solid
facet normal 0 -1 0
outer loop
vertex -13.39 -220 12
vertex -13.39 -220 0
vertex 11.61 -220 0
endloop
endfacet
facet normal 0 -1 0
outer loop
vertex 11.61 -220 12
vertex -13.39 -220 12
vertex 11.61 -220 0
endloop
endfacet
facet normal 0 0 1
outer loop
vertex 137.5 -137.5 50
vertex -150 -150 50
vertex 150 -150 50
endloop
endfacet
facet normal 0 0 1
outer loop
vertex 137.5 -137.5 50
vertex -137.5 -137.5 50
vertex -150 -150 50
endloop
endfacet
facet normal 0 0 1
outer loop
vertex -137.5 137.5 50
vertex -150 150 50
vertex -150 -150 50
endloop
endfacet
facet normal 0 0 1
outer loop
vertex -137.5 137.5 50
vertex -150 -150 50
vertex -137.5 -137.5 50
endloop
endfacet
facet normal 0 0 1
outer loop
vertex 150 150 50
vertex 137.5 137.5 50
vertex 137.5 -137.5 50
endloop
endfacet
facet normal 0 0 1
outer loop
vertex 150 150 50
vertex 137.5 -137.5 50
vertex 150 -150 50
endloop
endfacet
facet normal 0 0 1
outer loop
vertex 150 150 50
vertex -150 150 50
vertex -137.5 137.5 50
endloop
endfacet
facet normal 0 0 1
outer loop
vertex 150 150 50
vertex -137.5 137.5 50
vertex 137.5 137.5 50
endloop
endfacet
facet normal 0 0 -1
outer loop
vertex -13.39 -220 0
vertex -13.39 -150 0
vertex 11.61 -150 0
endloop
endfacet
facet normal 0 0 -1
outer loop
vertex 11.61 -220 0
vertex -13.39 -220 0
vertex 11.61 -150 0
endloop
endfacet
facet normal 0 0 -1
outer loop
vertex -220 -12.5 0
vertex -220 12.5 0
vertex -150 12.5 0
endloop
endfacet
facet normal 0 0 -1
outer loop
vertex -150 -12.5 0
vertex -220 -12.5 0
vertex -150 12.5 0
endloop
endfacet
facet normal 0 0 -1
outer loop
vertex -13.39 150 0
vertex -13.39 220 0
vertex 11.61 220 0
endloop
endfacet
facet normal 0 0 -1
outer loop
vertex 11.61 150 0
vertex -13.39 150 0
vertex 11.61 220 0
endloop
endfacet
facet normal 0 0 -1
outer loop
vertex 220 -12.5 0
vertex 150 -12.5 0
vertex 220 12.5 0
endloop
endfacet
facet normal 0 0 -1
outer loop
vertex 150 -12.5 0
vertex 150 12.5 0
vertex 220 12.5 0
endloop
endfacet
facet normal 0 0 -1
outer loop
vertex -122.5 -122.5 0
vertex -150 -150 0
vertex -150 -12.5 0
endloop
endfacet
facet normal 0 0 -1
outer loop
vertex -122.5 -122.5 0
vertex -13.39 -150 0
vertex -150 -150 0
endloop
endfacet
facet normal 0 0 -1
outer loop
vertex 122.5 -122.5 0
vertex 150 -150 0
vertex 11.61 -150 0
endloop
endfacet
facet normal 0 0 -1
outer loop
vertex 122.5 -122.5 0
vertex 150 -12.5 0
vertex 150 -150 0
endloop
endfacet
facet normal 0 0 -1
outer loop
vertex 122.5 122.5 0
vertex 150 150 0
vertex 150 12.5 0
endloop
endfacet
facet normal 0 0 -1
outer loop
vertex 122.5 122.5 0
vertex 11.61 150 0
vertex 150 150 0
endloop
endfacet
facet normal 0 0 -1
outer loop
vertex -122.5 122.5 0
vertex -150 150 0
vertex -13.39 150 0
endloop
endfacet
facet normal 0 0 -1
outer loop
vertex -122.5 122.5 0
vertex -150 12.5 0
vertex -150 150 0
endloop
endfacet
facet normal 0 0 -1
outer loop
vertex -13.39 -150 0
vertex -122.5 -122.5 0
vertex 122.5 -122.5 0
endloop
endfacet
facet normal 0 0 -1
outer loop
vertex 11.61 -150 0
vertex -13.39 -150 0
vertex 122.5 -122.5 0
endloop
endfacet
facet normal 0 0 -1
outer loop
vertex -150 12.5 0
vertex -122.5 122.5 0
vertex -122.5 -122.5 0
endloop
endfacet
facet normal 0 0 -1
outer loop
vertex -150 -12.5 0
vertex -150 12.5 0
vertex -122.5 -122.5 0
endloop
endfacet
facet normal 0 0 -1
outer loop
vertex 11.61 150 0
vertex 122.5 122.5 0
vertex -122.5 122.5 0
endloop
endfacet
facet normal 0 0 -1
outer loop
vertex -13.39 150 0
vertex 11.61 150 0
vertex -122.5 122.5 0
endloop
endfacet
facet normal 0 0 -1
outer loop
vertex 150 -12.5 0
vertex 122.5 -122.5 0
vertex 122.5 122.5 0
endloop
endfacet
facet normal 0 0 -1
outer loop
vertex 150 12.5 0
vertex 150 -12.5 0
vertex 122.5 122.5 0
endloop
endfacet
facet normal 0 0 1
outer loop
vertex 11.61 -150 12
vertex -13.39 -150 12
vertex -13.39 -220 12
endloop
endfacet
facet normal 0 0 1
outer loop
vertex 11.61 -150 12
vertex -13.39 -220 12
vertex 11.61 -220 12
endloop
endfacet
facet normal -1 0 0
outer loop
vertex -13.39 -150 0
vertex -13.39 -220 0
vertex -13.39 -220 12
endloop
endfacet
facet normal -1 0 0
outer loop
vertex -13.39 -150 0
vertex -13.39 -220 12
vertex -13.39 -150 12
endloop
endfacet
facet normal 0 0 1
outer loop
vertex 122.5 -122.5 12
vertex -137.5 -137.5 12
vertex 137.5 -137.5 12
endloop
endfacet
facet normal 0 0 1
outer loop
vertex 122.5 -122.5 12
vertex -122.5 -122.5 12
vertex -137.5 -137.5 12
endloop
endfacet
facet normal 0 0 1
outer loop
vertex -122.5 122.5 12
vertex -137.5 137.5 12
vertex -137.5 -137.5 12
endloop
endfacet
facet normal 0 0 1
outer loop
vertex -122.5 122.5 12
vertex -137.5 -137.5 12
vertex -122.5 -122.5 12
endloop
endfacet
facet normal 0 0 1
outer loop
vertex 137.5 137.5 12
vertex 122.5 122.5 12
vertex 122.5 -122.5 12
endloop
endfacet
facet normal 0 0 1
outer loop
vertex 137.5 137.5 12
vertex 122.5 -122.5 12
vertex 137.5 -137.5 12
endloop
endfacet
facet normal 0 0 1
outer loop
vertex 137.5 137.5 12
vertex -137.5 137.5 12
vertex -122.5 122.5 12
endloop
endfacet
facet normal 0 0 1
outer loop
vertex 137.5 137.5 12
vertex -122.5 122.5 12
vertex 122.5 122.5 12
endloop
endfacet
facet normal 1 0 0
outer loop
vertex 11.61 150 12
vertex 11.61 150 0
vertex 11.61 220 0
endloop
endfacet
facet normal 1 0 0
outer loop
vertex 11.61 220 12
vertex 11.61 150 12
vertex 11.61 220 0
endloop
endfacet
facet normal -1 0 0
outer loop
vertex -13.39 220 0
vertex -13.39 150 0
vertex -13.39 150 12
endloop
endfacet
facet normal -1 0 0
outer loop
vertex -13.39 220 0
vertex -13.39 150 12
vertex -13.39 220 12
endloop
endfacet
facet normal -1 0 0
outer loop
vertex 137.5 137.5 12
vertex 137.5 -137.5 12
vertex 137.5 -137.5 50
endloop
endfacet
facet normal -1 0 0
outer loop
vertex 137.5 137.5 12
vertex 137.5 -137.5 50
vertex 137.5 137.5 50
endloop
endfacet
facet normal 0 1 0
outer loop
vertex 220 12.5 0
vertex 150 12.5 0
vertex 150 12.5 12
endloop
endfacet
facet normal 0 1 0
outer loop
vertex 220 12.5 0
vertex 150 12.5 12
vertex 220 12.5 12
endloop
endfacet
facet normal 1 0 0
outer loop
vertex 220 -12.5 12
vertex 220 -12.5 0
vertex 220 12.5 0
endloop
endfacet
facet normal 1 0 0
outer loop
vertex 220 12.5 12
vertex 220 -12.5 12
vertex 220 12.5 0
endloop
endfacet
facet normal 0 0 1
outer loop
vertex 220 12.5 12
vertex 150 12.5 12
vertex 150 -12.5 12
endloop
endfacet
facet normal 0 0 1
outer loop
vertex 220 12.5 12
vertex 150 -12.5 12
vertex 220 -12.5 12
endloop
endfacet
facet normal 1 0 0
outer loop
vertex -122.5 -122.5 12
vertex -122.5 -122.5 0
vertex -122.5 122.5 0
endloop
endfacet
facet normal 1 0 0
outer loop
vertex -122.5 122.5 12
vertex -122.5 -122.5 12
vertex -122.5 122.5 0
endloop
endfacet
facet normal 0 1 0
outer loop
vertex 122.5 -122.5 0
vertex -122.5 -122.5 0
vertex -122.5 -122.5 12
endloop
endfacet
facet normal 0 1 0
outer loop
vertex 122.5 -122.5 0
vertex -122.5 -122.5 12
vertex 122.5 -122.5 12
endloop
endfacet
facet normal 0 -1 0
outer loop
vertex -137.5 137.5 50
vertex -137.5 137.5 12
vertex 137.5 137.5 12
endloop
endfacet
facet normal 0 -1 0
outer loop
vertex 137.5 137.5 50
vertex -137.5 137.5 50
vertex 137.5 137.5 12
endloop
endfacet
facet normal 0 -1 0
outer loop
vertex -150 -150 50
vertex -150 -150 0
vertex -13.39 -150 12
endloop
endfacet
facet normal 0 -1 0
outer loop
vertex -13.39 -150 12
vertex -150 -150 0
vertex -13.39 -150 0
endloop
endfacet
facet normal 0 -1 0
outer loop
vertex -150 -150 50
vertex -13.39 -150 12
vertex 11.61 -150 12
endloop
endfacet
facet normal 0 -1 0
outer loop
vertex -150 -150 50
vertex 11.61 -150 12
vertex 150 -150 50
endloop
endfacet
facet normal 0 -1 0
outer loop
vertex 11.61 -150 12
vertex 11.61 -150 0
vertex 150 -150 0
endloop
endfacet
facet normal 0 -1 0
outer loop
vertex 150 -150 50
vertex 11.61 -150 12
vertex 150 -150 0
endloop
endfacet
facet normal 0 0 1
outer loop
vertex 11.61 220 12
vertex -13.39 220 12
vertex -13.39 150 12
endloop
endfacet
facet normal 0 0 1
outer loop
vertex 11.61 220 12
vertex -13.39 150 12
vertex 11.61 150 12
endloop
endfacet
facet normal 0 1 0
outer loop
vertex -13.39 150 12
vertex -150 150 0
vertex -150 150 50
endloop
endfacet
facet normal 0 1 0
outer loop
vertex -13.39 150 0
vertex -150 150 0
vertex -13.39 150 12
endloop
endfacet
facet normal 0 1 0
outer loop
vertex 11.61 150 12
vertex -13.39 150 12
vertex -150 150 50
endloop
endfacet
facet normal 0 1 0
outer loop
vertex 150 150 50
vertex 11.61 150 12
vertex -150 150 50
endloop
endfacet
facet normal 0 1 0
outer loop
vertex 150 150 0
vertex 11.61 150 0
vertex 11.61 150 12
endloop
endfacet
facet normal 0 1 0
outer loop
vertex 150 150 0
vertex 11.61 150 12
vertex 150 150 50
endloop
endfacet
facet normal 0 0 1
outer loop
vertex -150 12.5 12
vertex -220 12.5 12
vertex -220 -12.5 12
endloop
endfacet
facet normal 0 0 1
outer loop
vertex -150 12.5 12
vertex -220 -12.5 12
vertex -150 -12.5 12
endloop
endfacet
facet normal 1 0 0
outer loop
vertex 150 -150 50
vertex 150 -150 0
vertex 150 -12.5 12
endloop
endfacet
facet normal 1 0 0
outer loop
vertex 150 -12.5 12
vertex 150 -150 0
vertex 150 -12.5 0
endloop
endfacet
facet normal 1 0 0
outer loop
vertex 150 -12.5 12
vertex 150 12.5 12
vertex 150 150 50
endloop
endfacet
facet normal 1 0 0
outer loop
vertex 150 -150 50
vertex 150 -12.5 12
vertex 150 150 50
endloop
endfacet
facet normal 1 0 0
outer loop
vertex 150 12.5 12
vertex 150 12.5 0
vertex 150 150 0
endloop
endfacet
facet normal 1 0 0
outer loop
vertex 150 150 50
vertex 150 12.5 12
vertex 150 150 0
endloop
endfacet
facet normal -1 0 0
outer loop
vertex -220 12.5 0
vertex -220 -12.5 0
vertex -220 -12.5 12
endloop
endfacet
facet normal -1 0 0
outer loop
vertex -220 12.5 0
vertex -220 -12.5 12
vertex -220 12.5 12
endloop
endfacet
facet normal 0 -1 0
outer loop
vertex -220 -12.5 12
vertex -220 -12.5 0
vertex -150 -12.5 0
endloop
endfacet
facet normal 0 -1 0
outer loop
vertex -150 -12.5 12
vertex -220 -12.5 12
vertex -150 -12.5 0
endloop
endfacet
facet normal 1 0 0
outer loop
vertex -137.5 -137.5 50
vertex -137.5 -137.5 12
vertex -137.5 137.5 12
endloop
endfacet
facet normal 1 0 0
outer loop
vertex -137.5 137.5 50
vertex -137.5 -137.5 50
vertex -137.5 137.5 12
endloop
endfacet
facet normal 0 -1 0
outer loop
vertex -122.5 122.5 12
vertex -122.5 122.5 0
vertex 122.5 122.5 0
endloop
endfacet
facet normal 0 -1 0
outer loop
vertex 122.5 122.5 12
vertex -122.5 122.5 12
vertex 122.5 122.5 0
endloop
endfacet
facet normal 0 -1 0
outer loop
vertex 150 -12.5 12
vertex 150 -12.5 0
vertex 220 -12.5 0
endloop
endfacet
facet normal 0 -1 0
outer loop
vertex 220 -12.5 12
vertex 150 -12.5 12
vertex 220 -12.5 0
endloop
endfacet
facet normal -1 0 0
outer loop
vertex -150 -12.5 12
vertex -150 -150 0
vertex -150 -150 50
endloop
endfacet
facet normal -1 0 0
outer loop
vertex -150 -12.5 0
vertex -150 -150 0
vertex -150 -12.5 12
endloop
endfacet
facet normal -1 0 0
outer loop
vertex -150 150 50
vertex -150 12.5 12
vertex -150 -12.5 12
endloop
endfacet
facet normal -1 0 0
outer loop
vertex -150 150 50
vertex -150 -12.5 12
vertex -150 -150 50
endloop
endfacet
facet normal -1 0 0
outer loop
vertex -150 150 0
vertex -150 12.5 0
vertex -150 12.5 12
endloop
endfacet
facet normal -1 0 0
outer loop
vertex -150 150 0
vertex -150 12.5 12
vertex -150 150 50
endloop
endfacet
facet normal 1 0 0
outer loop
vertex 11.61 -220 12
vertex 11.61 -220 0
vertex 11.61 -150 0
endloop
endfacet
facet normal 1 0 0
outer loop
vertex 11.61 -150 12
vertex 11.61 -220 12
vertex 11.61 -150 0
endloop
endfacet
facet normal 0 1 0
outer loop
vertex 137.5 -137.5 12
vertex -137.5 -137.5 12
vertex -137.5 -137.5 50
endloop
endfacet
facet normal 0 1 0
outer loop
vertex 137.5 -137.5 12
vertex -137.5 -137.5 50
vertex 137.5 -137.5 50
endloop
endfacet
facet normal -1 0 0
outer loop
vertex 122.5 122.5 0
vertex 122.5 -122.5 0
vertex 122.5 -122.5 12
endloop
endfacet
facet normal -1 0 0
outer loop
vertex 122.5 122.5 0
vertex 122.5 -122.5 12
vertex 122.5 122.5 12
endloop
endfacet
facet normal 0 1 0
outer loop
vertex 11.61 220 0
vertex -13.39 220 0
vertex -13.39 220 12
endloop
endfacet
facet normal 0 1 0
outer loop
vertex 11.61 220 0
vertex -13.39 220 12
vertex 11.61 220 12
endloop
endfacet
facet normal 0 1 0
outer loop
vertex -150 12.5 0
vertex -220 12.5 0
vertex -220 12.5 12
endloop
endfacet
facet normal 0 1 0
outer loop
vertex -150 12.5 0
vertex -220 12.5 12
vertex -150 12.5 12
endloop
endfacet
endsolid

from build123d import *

# Parameters (mm, degrees)
ESQUISSE1_W        = 300
ESQUISSE1_H        = 300
ESQUISSE1_W_2      = 275
ESQUISSE1_H_2      = 275
BOSS_EXTRU_1_DEPTH = 50
ESQUISSE2_W        = 275
ESQUISSE2_H        = 275
ESQUISSE2_W_2      = 245
ESQUISSE2_H_2      = 245
BOSS_EXTRU_2_DEPTH = 12
ESQUISSE3_W        = 25
ESQUISSE3_H        = 70
ESQUISSE3_W_2      = 70
ESQUISSE3_H_2      = 25
BOSS_EXTRU_3_DEPTH = 12


with BuildPart() as part:
    # Esquisse1 → Boss.-Extru.1 (new body)
    with BuildSketch(Plane.XY):
        Rectangle(ESQUISSE1_W, ESQUISSE1_H)
        Rectangle(ESQUISSE1_W_2, ESQUISSE1_H_2, mode=Mode.SUBTRACT)
    extrude(amount=BOSS_EXTRU_1_DEPTH)

    # Esquisse2 → Boss.-Extru.2 (add)
    with BuildSketch(Plane.XY):
        Rectangle(ESQUISSE2_W, ESQUISSE2_H)
        Rectangle(ESQUISSE2_W_2, ESQUISSE2_H_2, mode=Mode.SUBTRACT)
    extrude(amount=BOSS_EXTRU_2_DEPTH)

    # Esquisse3 → Boss.-Extru.3 (add)
    with BuildSketch(Plane.XY):
        with Locations((-0.890165861, 185)):
            Rectangle(ESQUISSE3_W, ESQUISSE3_H)
        with Locations((185, 0)):
            Rectangle(ESQUISSE3_W_2, ESQUISSE3_H_2)
        with Locations((-185, 0)):
            Rectangle(ESQUISSE3_W_2, ESQUISSE3_H_2)
        with Locations((-0.890165861, -185)):
            Rectangle(ESQUISSE3_W, ESQUISSE3_H)
    extrude(amount=BOSS_EXTRU_3_DEPTH)


solid = part.part
